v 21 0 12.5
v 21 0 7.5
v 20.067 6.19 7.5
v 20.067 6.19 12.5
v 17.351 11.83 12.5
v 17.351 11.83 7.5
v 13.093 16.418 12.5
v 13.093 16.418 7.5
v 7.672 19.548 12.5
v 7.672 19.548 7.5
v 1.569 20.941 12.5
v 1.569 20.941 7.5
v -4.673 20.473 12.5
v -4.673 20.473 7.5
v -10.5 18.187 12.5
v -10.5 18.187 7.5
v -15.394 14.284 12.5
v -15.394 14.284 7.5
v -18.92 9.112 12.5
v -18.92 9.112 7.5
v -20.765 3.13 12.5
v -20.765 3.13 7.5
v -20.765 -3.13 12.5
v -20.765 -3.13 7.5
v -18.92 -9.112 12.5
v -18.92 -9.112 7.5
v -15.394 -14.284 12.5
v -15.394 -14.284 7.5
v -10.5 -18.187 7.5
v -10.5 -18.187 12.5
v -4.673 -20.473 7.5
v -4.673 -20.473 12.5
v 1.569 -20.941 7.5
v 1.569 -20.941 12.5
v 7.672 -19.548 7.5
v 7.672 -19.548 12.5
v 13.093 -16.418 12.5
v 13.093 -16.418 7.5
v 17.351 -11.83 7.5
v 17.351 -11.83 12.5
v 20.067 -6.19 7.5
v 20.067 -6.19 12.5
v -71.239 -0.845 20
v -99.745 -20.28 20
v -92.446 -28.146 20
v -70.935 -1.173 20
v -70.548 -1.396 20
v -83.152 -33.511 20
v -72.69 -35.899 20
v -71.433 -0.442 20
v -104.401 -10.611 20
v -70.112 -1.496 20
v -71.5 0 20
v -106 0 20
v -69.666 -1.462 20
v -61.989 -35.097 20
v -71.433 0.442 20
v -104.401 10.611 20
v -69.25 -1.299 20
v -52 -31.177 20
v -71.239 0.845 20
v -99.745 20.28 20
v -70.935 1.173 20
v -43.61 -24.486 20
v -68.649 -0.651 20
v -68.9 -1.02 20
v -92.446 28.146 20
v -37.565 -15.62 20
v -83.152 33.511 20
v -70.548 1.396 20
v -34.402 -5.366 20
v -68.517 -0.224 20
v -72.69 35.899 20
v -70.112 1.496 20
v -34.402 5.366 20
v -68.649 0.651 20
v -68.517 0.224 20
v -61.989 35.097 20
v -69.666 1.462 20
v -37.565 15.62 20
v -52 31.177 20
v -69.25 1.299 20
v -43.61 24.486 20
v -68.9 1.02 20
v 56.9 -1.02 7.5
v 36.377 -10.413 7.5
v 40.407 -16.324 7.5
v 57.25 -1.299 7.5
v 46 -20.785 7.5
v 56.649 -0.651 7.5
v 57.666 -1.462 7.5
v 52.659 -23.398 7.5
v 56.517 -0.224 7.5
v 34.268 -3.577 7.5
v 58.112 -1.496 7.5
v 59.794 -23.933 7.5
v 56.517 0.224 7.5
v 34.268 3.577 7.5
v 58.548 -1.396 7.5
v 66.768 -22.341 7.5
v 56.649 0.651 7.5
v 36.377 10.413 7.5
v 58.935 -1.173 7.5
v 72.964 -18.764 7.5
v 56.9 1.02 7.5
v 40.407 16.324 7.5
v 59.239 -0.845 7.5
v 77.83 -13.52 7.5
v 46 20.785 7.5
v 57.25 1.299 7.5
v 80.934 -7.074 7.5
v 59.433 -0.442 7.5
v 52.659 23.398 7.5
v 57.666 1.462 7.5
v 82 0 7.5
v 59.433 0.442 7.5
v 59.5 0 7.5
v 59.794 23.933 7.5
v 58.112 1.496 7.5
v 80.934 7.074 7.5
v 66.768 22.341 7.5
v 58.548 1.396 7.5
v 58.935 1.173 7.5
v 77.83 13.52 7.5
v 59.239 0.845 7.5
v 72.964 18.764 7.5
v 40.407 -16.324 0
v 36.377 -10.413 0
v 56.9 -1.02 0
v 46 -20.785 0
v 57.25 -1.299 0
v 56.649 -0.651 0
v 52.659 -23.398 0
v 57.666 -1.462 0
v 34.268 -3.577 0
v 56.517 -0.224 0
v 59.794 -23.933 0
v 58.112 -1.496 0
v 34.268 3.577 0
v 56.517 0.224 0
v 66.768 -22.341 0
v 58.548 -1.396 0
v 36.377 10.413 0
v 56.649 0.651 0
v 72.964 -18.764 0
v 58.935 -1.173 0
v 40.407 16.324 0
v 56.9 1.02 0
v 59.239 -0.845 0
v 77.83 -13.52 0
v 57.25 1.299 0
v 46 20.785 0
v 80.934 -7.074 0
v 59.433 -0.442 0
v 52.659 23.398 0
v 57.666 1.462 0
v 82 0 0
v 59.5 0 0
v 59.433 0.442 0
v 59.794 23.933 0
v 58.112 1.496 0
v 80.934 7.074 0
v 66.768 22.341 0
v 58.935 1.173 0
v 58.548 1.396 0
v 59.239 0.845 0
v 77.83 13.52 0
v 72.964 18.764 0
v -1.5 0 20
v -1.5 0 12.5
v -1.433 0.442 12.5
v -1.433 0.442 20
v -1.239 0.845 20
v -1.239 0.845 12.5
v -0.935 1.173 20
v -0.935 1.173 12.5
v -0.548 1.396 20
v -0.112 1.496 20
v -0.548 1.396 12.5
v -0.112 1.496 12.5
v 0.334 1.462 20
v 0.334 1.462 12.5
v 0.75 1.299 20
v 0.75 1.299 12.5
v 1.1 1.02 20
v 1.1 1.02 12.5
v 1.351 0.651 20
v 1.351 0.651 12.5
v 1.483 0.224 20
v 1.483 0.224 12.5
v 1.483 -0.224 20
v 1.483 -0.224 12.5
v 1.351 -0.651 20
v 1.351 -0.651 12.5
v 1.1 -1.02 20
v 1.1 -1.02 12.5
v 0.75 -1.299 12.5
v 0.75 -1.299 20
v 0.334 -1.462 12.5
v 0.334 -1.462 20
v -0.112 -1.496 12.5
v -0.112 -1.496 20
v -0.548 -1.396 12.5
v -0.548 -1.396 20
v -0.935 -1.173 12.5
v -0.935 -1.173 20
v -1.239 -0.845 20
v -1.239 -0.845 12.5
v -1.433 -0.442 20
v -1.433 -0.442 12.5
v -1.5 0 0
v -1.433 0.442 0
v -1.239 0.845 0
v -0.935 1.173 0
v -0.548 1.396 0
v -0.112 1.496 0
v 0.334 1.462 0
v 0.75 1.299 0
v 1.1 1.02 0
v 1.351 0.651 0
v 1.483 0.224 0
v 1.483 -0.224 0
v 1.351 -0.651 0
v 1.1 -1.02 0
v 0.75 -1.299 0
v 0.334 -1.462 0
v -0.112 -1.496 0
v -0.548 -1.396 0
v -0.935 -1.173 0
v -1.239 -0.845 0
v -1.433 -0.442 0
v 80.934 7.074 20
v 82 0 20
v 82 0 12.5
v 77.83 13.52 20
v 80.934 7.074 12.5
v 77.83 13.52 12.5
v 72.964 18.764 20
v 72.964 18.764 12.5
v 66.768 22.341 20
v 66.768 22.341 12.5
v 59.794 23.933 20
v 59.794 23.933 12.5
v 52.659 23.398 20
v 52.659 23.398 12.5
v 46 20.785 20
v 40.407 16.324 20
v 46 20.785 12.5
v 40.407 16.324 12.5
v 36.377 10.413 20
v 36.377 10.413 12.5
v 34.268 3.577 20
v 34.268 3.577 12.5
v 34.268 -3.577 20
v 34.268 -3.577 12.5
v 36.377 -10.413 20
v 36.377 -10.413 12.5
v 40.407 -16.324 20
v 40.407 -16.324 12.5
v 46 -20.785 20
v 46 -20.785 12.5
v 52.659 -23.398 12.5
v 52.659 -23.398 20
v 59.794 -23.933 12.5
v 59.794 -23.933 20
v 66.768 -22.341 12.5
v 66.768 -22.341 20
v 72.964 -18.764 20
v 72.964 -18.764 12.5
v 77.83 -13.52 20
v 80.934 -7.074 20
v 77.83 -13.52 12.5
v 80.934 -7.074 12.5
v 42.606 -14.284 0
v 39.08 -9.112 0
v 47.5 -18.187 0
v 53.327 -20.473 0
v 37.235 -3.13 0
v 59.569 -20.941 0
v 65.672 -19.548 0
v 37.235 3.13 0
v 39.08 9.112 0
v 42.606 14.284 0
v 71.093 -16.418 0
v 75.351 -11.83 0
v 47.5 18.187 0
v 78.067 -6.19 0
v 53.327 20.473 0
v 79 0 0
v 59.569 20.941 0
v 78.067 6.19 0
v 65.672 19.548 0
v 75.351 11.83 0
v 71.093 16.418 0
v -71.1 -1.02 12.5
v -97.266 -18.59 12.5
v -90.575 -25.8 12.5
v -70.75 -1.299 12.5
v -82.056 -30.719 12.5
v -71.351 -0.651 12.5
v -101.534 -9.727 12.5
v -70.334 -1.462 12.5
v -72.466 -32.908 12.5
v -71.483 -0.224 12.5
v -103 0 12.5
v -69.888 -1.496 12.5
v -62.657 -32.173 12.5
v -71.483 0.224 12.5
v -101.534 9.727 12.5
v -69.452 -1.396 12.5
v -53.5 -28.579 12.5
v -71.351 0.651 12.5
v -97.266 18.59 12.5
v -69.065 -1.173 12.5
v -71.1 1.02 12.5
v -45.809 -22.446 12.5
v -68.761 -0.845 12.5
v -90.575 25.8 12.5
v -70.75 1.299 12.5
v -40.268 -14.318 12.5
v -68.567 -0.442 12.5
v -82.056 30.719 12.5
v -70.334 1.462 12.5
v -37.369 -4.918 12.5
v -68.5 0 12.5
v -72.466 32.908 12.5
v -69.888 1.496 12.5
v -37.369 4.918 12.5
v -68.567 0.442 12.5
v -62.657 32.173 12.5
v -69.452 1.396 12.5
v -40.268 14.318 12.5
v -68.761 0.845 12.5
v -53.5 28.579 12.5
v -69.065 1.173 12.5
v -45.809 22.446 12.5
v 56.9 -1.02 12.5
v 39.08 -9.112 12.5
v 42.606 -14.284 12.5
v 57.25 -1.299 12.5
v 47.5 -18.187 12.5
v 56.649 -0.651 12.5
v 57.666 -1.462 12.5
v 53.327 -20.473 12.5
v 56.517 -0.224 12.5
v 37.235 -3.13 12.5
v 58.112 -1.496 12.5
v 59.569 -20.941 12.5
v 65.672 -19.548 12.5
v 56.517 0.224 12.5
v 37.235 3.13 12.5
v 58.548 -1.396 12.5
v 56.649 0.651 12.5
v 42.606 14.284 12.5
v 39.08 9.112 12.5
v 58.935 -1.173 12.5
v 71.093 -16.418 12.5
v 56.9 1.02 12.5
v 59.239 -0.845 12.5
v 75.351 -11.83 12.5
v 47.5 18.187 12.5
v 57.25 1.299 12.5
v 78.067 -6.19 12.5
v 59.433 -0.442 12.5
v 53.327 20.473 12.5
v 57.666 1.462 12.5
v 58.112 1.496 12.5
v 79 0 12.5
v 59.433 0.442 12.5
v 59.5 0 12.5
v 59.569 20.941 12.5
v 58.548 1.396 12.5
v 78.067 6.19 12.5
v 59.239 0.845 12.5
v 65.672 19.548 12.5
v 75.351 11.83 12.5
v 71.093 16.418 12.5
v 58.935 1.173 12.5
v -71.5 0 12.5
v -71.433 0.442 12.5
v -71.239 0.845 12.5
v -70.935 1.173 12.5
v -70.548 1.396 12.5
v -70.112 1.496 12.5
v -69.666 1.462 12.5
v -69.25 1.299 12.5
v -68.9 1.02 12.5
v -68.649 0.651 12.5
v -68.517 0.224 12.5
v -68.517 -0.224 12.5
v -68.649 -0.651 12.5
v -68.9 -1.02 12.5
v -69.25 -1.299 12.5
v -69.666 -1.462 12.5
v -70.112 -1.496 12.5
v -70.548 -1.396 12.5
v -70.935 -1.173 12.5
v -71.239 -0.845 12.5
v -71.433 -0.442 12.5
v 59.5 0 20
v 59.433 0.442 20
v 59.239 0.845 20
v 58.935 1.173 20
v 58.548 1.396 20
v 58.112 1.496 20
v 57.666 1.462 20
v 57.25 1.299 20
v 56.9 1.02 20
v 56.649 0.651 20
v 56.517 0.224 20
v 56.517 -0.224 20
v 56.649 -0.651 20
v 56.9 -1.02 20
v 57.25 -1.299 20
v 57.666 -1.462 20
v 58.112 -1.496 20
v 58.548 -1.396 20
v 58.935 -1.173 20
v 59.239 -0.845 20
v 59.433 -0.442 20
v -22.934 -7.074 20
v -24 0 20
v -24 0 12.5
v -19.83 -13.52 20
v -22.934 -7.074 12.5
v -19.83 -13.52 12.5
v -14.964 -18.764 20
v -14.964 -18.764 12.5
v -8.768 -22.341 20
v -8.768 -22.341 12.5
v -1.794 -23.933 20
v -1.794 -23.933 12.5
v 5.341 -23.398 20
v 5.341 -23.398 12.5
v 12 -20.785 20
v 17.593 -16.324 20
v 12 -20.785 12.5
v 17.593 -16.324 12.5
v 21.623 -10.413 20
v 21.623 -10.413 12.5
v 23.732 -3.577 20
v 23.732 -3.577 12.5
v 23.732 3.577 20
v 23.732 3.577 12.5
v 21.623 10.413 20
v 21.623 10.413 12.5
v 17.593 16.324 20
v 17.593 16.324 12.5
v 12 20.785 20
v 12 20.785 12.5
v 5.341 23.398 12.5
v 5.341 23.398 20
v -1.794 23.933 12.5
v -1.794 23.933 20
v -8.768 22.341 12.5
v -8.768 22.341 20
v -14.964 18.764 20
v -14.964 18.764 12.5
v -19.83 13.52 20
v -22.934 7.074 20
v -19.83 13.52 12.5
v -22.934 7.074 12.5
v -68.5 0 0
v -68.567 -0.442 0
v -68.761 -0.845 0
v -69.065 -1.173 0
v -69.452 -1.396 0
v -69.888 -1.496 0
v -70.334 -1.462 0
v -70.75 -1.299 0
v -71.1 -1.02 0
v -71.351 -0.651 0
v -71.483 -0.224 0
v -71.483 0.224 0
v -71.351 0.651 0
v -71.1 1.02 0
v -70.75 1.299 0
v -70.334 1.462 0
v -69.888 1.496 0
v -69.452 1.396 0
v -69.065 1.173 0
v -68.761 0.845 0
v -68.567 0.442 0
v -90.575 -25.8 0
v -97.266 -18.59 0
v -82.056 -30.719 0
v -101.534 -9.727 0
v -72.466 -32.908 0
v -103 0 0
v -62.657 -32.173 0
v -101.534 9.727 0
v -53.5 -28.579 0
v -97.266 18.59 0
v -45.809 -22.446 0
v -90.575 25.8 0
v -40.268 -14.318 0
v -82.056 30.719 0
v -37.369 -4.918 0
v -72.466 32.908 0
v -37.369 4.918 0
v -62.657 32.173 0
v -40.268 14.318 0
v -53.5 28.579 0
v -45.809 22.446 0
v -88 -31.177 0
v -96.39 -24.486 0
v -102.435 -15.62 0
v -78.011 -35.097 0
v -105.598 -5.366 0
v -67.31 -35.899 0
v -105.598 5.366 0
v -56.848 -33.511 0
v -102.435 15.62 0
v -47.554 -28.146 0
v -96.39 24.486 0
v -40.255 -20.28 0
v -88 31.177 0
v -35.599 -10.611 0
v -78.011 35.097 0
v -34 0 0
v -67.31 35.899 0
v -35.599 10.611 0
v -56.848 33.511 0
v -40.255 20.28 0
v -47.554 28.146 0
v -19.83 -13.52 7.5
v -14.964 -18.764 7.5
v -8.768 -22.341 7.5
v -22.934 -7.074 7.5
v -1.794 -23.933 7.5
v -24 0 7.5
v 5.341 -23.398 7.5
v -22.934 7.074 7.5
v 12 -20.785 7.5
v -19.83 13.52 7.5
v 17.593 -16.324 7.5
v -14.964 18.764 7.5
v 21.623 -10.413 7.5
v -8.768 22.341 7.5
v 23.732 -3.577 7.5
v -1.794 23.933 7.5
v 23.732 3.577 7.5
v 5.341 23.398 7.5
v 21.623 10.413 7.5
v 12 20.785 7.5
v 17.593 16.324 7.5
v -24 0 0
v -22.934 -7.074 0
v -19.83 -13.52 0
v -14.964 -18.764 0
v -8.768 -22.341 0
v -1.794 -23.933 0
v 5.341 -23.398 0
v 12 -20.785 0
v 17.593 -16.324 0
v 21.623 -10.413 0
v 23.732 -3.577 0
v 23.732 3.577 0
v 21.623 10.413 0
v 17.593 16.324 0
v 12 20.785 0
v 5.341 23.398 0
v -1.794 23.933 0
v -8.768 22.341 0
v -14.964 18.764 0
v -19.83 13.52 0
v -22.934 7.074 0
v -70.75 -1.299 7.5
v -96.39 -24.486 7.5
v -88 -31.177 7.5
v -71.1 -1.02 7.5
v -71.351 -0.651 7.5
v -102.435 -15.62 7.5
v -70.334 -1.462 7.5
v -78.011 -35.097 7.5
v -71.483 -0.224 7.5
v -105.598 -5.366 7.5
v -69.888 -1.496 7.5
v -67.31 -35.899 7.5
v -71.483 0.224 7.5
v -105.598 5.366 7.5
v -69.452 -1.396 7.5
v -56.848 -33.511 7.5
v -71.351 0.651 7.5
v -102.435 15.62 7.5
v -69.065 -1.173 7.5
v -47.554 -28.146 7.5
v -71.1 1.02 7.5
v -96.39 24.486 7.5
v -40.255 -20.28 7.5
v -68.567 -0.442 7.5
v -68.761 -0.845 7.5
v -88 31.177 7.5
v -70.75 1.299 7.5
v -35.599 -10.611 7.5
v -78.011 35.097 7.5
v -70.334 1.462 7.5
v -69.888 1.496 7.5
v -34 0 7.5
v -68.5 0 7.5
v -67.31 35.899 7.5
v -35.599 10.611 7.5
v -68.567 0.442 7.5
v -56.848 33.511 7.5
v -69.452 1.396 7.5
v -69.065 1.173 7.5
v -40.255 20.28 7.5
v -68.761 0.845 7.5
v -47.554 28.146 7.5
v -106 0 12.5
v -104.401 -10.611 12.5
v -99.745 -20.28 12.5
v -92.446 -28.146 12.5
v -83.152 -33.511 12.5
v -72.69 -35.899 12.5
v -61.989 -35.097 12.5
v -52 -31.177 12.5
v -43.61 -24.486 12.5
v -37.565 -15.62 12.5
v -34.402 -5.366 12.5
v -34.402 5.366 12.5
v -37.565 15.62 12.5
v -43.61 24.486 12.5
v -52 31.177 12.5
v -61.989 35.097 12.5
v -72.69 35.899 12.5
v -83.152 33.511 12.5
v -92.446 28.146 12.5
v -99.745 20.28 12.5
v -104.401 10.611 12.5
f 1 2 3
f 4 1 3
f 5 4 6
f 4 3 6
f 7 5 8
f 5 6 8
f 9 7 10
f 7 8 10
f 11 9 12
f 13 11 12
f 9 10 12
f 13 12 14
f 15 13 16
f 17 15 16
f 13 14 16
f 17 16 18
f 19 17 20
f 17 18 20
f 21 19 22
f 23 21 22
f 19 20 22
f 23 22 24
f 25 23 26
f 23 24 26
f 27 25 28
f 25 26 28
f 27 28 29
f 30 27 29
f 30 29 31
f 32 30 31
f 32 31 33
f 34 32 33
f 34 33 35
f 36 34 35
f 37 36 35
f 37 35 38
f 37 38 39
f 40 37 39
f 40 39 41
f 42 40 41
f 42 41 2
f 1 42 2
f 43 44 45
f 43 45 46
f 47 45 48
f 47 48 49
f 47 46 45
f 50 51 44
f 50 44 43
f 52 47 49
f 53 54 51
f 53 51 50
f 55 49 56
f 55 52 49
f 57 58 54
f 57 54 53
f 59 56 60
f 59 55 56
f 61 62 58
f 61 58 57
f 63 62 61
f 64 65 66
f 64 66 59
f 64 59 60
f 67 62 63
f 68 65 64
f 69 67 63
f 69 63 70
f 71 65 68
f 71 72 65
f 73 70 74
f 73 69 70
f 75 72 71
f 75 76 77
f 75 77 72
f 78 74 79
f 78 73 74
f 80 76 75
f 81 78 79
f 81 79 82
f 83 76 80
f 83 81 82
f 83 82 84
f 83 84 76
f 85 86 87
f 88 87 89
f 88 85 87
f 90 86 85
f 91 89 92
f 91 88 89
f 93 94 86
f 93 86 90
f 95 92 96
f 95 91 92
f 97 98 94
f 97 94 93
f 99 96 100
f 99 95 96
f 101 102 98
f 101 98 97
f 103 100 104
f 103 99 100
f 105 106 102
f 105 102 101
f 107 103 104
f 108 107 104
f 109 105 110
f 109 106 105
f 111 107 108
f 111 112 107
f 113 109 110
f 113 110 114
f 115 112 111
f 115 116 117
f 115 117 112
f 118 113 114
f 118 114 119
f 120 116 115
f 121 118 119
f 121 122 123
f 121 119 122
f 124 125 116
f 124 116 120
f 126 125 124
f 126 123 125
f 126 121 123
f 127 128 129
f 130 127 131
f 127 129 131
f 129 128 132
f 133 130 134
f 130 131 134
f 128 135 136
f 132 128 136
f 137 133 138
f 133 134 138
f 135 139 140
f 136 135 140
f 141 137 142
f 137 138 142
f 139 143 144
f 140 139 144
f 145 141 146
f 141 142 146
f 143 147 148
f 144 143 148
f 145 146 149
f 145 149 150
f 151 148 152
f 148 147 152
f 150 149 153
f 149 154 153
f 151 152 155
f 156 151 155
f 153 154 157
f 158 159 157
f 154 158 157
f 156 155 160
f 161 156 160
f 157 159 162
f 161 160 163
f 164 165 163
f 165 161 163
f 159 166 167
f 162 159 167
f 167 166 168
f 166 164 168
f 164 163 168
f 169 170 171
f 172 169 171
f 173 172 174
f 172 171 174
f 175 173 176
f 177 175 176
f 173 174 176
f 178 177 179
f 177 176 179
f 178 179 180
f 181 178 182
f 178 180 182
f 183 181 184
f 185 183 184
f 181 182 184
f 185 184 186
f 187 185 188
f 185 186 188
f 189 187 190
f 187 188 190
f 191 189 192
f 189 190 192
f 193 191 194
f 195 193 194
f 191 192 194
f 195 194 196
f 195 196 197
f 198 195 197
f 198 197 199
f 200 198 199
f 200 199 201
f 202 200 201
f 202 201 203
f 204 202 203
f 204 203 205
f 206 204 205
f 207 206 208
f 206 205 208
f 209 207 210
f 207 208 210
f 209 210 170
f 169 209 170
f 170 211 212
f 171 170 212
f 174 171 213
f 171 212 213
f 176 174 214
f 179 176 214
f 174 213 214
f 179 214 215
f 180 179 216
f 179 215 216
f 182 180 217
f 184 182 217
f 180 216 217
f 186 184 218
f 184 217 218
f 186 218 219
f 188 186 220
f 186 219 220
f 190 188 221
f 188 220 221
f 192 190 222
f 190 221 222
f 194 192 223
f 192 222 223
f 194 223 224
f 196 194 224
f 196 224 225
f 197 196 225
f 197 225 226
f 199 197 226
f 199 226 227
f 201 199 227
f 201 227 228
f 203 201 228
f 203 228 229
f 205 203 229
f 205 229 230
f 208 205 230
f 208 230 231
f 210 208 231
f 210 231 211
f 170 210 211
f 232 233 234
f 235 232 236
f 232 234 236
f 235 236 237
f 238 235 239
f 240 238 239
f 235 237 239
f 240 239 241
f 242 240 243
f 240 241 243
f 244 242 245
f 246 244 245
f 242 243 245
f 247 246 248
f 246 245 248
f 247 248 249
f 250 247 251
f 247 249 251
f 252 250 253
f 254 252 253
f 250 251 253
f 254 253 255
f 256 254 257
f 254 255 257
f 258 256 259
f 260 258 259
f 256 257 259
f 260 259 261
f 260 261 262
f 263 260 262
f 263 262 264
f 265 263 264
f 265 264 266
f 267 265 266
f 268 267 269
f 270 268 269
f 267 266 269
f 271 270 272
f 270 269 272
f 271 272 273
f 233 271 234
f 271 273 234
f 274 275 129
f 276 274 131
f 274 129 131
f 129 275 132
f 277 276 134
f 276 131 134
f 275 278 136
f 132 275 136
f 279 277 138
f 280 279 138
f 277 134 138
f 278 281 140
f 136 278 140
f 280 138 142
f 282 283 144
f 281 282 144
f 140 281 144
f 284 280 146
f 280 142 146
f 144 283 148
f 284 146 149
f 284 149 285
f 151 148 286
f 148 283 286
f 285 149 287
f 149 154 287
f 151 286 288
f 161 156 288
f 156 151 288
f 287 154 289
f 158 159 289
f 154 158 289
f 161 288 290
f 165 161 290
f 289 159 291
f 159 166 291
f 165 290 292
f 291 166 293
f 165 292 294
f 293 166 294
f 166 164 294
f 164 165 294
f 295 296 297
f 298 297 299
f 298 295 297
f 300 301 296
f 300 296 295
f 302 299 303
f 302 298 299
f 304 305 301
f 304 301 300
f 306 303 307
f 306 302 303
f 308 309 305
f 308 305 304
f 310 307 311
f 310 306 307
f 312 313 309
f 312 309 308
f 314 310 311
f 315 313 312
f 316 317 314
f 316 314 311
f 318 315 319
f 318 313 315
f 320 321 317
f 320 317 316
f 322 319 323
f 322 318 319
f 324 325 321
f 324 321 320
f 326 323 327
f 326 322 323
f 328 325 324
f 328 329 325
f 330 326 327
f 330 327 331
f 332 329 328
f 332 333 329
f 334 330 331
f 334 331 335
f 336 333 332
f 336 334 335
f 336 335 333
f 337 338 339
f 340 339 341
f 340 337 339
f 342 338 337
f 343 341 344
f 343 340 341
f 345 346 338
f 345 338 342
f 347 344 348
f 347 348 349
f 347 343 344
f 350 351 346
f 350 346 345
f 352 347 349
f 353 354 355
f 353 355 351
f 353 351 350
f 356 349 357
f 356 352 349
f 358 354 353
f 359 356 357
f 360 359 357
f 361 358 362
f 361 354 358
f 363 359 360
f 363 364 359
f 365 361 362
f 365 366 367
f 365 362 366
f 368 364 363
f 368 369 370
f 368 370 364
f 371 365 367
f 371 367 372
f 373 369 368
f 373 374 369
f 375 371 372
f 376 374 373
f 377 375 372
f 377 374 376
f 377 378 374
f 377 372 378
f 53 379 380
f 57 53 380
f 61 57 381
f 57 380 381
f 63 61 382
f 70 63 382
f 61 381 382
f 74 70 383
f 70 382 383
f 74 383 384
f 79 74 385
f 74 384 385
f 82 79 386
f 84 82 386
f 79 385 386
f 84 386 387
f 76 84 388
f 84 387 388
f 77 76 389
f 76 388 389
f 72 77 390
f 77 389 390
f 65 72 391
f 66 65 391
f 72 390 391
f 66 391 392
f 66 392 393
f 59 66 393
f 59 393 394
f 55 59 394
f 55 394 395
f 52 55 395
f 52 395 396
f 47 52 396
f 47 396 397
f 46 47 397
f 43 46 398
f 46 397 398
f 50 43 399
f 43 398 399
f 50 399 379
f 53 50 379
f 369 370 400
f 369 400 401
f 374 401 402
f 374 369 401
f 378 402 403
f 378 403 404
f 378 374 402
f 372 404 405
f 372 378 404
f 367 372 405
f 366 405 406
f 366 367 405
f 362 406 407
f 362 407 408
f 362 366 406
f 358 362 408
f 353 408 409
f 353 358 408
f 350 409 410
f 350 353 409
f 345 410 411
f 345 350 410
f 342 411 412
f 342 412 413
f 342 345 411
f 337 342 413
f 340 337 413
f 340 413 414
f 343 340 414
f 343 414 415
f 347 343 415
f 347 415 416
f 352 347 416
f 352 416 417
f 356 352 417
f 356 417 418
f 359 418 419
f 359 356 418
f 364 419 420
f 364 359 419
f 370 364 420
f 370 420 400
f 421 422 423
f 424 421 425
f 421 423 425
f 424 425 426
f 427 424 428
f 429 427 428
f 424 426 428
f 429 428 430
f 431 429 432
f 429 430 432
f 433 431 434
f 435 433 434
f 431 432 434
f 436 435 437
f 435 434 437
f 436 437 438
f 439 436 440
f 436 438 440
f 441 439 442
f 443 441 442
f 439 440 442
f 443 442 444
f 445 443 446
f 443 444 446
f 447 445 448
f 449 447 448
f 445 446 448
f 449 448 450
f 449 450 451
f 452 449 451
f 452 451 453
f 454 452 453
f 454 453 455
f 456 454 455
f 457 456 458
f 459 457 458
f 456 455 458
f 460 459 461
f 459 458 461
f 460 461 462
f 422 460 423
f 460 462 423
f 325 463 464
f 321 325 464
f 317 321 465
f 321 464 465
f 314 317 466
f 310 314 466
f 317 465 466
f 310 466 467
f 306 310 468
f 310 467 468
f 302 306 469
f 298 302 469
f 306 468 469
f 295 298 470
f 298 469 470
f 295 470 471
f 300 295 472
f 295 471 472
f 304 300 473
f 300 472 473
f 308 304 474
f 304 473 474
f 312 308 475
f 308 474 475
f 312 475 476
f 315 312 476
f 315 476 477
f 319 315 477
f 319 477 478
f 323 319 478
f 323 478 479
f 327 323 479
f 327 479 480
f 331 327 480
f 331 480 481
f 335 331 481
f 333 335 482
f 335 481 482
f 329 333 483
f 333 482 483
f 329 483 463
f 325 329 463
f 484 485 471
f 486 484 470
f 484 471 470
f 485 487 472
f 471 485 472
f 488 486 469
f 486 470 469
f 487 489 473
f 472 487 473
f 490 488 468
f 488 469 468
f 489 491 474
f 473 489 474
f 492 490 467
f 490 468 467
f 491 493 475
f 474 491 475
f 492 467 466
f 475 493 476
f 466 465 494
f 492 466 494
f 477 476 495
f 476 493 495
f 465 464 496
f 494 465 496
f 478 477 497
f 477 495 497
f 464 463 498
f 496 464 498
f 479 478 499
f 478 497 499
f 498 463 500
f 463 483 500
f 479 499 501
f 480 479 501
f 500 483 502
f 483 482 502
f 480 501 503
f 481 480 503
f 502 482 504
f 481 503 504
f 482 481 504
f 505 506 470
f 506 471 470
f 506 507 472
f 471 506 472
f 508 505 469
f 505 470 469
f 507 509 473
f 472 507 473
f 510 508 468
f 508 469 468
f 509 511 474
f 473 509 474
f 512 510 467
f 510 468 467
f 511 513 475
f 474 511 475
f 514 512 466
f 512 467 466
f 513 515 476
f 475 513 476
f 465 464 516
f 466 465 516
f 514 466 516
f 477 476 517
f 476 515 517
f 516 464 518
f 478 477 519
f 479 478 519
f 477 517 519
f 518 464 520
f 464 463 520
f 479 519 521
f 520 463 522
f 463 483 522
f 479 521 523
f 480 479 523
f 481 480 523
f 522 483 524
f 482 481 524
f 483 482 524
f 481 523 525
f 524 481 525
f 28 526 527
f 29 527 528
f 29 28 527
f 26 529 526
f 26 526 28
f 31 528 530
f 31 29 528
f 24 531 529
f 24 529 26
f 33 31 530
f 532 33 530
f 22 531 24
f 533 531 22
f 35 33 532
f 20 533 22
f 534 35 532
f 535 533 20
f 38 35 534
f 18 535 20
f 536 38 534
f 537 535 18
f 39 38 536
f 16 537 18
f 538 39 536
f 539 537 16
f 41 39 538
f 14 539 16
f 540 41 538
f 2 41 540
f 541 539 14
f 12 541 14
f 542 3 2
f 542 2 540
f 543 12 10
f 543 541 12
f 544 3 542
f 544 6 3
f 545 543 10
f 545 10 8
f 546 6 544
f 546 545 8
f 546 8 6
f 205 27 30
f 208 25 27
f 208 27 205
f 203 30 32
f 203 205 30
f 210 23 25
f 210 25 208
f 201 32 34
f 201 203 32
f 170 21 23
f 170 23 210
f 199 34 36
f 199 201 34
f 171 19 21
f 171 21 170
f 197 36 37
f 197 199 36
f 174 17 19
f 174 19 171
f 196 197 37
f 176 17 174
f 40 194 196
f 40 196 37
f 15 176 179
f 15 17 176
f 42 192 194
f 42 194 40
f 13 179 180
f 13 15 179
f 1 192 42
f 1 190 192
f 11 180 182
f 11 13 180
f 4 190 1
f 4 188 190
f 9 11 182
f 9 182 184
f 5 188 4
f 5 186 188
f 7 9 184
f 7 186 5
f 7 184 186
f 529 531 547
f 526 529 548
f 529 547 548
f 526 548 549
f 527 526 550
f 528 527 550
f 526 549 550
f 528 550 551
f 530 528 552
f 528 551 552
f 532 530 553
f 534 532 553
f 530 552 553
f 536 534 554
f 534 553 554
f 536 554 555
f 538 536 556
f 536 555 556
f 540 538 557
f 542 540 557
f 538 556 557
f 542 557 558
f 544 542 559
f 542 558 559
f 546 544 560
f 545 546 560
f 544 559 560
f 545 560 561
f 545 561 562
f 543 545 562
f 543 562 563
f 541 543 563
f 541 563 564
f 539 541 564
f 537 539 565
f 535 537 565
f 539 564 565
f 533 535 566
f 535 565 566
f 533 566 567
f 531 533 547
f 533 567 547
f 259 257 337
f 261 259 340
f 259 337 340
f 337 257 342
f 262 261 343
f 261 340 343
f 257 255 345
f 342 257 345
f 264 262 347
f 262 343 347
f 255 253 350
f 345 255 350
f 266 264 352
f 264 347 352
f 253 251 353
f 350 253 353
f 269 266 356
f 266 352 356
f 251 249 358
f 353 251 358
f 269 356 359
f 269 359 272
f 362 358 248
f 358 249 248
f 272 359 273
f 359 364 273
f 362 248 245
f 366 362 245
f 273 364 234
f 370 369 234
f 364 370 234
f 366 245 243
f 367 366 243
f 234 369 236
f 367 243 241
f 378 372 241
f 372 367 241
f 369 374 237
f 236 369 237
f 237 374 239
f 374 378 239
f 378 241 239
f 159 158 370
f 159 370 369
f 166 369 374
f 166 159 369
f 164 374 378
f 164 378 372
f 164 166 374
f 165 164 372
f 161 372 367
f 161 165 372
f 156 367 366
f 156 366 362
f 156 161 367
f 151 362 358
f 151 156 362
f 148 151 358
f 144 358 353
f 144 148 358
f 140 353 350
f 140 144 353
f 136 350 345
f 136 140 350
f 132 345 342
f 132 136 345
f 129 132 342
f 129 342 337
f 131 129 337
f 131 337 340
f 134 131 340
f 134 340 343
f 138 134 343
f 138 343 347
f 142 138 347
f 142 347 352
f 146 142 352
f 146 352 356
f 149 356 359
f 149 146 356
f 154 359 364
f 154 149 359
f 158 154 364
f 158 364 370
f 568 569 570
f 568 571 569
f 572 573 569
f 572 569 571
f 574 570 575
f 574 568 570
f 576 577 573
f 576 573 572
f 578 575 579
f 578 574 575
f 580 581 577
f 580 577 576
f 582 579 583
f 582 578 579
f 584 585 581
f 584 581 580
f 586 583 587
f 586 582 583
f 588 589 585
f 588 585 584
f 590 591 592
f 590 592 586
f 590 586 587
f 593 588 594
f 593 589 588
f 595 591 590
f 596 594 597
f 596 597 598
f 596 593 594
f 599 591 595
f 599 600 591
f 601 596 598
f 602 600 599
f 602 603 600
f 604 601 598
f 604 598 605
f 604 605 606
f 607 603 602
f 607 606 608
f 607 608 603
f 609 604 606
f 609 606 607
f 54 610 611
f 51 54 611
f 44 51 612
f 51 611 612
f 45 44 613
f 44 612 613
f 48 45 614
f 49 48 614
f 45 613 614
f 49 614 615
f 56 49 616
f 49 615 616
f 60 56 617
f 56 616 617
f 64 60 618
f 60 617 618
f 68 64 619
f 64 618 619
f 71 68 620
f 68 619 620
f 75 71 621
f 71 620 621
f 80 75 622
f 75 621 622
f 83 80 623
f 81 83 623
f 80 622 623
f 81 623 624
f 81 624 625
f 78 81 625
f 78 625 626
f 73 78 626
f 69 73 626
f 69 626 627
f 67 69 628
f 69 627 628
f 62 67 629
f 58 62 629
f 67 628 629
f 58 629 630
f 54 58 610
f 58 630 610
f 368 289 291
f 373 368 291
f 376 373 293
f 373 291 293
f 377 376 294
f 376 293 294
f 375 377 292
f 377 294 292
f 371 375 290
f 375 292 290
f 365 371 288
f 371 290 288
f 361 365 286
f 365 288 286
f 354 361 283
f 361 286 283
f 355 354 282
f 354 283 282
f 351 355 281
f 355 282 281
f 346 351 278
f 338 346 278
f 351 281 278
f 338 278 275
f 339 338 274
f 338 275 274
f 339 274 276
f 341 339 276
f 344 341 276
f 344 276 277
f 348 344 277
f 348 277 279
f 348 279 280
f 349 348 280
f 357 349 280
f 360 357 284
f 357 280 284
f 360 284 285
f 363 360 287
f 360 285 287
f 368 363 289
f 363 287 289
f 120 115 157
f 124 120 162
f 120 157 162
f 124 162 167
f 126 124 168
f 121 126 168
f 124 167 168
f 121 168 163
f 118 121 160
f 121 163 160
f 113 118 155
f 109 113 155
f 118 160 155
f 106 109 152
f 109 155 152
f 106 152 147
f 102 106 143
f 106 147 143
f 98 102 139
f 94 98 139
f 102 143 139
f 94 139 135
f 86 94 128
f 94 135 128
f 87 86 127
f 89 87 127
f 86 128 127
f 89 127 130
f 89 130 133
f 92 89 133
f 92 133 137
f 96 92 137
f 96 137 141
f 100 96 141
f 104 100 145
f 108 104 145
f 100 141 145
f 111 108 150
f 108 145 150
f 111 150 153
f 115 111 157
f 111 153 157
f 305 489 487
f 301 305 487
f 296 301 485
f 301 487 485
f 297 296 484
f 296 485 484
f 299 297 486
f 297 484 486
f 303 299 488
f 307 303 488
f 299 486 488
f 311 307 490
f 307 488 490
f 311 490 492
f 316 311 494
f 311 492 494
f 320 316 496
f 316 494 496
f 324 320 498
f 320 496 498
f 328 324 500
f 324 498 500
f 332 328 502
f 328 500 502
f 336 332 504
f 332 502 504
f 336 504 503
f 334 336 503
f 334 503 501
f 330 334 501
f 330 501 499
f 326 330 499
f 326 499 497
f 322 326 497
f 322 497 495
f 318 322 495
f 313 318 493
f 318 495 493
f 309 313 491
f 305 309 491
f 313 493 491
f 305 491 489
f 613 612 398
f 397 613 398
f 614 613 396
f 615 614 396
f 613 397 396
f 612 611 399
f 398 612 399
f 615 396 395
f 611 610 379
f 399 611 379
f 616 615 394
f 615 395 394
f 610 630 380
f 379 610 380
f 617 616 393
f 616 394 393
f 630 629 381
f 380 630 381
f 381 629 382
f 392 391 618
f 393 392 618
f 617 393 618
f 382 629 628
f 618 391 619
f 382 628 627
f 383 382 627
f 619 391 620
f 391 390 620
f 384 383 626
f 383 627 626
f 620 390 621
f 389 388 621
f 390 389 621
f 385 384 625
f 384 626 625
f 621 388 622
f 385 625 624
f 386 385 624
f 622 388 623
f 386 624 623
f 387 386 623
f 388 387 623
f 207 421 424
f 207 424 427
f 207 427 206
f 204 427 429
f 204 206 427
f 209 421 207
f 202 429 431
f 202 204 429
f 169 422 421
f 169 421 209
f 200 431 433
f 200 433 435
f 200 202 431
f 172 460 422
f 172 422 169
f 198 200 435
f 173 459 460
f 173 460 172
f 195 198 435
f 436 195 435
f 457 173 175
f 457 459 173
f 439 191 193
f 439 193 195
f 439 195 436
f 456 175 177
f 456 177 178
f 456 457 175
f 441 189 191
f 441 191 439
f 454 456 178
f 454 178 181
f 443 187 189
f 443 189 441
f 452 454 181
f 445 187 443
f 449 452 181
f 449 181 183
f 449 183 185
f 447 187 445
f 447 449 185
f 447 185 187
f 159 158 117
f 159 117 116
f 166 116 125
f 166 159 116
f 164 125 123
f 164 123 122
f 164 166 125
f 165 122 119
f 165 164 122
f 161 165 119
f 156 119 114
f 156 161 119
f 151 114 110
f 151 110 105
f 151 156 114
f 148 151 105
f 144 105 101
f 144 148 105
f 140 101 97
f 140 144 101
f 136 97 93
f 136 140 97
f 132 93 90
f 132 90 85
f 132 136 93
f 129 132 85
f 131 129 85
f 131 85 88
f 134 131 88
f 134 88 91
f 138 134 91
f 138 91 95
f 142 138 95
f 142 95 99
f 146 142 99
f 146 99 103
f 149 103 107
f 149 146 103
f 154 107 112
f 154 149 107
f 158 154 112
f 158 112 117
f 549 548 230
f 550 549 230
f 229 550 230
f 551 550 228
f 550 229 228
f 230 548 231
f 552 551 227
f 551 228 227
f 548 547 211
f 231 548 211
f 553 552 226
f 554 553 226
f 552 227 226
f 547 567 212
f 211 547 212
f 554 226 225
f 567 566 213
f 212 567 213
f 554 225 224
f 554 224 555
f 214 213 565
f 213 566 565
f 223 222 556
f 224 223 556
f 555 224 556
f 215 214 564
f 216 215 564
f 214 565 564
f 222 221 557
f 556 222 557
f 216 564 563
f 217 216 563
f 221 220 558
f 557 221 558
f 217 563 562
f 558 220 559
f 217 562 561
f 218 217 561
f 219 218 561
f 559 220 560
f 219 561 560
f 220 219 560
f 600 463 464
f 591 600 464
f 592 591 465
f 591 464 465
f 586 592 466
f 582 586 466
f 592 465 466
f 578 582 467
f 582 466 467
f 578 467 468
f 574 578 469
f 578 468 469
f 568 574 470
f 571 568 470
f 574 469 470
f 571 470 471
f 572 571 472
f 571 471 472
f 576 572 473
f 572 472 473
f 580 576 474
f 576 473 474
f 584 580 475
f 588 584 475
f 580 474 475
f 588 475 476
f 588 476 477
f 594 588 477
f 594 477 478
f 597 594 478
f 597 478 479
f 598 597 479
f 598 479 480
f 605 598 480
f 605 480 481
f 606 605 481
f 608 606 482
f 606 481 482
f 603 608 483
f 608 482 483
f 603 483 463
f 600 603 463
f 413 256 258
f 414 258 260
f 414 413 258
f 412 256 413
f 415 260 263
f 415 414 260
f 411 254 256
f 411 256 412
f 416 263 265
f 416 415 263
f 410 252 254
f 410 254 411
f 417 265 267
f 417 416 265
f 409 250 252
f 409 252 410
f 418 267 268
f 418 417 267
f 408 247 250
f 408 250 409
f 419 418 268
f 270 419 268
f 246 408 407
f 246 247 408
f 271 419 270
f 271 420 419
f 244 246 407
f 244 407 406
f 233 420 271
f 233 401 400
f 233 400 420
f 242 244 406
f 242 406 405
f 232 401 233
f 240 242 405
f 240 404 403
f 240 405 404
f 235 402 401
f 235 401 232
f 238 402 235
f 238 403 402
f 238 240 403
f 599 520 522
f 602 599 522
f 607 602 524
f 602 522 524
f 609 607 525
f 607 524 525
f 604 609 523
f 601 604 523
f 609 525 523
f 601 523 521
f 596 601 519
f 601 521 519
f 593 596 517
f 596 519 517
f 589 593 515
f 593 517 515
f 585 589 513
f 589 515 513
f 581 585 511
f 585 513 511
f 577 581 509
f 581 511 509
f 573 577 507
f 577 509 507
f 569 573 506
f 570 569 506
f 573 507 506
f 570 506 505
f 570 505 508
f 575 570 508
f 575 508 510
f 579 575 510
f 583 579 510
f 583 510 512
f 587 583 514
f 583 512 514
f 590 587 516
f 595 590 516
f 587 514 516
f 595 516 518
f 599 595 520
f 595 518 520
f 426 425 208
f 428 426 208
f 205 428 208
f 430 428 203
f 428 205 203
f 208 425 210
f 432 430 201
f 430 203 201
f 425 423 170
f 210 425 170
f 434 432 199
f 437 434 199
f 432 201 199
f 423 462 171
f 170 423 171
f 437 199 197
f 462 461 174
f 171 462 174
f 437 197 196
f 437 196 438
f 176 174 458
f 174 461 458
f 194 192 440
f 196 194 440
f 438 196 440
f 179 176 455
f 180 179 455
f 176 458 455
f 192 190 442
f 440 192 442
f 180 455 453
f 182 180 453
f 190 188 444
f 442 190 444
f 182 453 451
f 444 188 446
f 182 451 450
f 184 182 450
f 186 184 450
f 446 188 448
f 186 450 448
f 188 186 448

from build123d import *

# Parameters (mm, degrees)
F1_DEPTH = 7.5
F2_DEPTH = 12.5
F3_START = 12.5
F3_DEPTH = 7.5
F5_DEPTH = 7.5
F4_R     = 24
F4_R_2   = 21
F4_R_3   = 1.5
F6_DEPTH = 12.5
F7_START = 12.5
F7_DEPTH = 7.5


with BuildPart() as f1:
    # F0 (on Top) → F1 (new body)
    with BuildSketch(Plane.XY):
        with BuildLine():
            Line((21, 0), (24, 0))
            ThreePointArc((24, 0), (0, 24), (-24, 0))
            Line((-24, 0), (-21, 0))
            ThreePointArc((-21, 0), (0, 21), (21, 0))
        make_face()
        with BuildLine():
            ThreePointArc((-24, 0), (0, -24), (24, 0))
            Line((24, 0), (21, 0))
            ThreePointArc((21, 0), (0, -21), (-21, 0))
            Line((-21, 0), (-24, 0))
        make_face()
        with BuildLine():
            ThreePointArc((-21, 0), (0, -21), (21, 0))
            Line((21, 0), (1.5, 0))
            ThreePointArc((1.5, 0), (0, -1.5), (-1.5, 0))
            Line((-1.5, 0), (-21, 0))
        make_face()
        with BuildLine():
            Line((1.5, 0), (21, 0))
            ThreePointArc((21, 0), (0, 21), (-21, 0))
            Line((-21, 0), (-1.5, 0))
            ThreePointArc((-1.5, 0), (0, 1.5), (1.5, 0))
        make_face()
    extrude(amount=F1_DEPTH)

    # F0 (on Top) → F2 (join)
    with BuildSketch(Plane.XY):
        with BuildLine():
            ThreePointArc((-21, 0), (0, -21), (21, 0))
            Line((21, 0), (1.5, 0))
            ThreePointArc((1.5, 0), (0, -1.5), (-1.5, 0))
            Line((-1.5, 0), (-21, 0))
        make_face()
        with BuildLine():
            Line((1.5, 0), (21, 0))
            ThreePointArc((21, 0), (0, 21), (-21, 0))
            Line((-21, 0), (-1.5, 0))
            ThreePointArc((-1.5, 0), (0, 1.5), (1.5, 0))
        make_face()
    extrude(amount=F2_DEPTH)


with BuildPart() as f3:
    # F0 (on Top) → F3 (new body)
    with BuildSketch(Plane.XY.offset(F3_START)):
        with BuildLine():
            Line((21, 0), (24, 0))
            ThreePointArc((24, 0), (0, 24), (-24, 0))
            Line((-24, 0), (-21, 0))
            ThreePointArc((-21, 0), (0, 21), (21, 0))
        make_face()
        with BuildLine():
            ThreePointArc((-24, 0), (0, -24), (24, 0))
            Line((24, 0), (21, 0))
            ThreePointArc((21, 0), (0, -21), (-21, 0))
            Line((-21, 0), (-24, 0))
        make_face()
        with BuildLine():
            ThreePointArc((-21, 0), (0, -21), (21, 0))
            Line((21, 0), (1.5, 0))
            ThreePointArc((1.5, 0), (0, -1.5), (-1.5, 0))
            Line((-1.5, 0), (-21, 0))
        make_face()
        with BuildLine():
            Line((1.5, 0), (21, 0))
            ThreePointArc((21, 0), (0, 21), (-21, 0))
            Line((-21, 0), (-1.5, 0))
            ThreePointArc((-1.5, 0), (0, 1.5), (1.5, 0))
        make_face()
    extrude(amount=F3_DEPTH)


with BuildPart() as f5:
    # F4 (on Top) → F5 (new body)
    with BuildSketch(Plane.XY):
        with BuildLine():
            Line((-68.5, 0), (-37, 0))
            ThreePointArc((-37, 0), (-70, 33), (-103, 0))
            Line((-103, 0), (-71.5, 0))
            ThreePointArc((-71.5, 0), (-70, 1.5), (-68.5, 0))
        make_face()
        with BuildLine():
            ThreePointArc((-103, 0), (-70, -33), (-37, 0))
            Line((-37, 0), (-68.5, 0))
            ThreePointArc((-68.5, 0), (-70, -1.5), (-71.5, 0))
            Line((-71.5, 0), (-103, 0))
        make_face()
        with BuildLine():
            ThreePointArc((-106, 0), (-70, -36), (-34, 0))
            Line((-34, 0), (-37, 0))
            ThreePointArc((-37, 0), (-70, -33), (-103, 0))
            Line((-103, 0), (-106, 0))
        make_face()
        with BuildLine():
            Line((-37, 0), (-34, 0))
            ThreePointArc((-34, 0), (-70, 36), (-106, 0))
            Line((-106, 0), (-103, 0))
            ThreePointArc((-103, 0), (-70, 33), (-37, 0))
        make_face()
    extrude(amount=F5_DEPTH)


with BuildPart() as f5b:
    # F4 (on Top) → F5, piece 2 (new body)
    with BuildSketch(Plane.XY):
        with Locations((58, 0)):
            Circle(F4_R)
        with Locations((58, 0)):
            Circle(F4_R_2, mode=Mode.SUBTRACT)
        with Locations((58, 0)):
            Circle(F4_R_2)
        with Locations((58, 0)):
            Circle(F4_R_3, mode=Mode.SUBTRACT)
    extrude(amount=F5_DEPTH)


with BuildPart() as f6:
    # F4 (on Top) → F6 (new body)
    with BuildSketch(Plane.XY):
        with BuildLine():
            Line((-68.5, 0), (-37, 0))
            ThreePointArc((-37, 0), (-70, 33), (-103, 0))
            Line((-103, 0), (-71.5, 0))
            ThreePointArc((-71.5, 0), (-70, 1.5), (-68.5, 0))
        make_face()
        with BuildLine():
            ThreePointArc((-103, 0), (-70, -33), (-37, 0))
            Line((-37, 0), (-68.5, 0))
            ThreePointArc((-68.5, 0), (-70, -1.5), (-71.5, 0))
            Line((-71.5, 0), (-103, 0))
        make_face()
    extrude(amount=F6_DEPTH)


with BuildPart() as f6b:
    # F4 (on Top) → F6, piece 2 (new body)
    with BuildSketch(Plane.XY):
        with Locations((58, 0)):
            Circle(F4_R_2)
        with Locations((58, 0)):
            Circle(F4_R_3, mode=Mode.SUBTRACT)
    extrude(amount=F6_DEPTH)


with BuildPart() as f7:
    # F4 (on Top) → F7 (new body)
    with BuildSketch(Plane.XY.offset(F7_START)):
        with BuildLine():
            ThreePointArc((-103, 0), (-70, -33), (-37, 0))
            Line((-37, 0), (-68.5, 0))
            ThreePointArc((-68.5, 0), (-70, -1.5), (-71.5, 0))
            Line((-71.5, 0), (-103, 0))
        make_face()
        with BuildLine():
            Line((-68.5, 0), (-37, 0))
            ThreePointArc((-37, 0), (-70, 33), (-103, 0))
            Line((-103, 0), (-71.5, 0))
            ThreePointArc((-71.5, 0), (-70, 1.5), (-68.5, 0))
        make_face()
        with BuildLine():
            Line((-37, 0), (-34, 0))
            ThreePointArc((-34, 0), (-70, 36), (-106, 0))
            Line((-106, 0), (-103, 0))
            ThreePointArc((-103, 0), (-70, 33), (-37, 0))
        make_face()
        with BuildLine():
            ThreePointArc((-106, 0), (-70, -36), (-34, 0))
            Line((-34, 0), (-37, 0))
            ThreePointArc((-37, 0), (-70, -33), (-103, 0))
            Line((-103, 0), (-106, 0))
        make_face()
    extrude(amount=F7_DEPTH)


with BuildPart() as f7b:
    # F4 (on Top) → F7, piece 2 (new body)
    with BuildSketch(Plane.XY.offset(F7_START)):
        with Locations((58, 0)):
            Circle(F4_R)
        with Locations((58, 0)):
            Circle(F4_R_2, mode=Mode.SUBTRACT)
        with Locations((58, 0)):
            Circle(F4_R_2)
        with Locations((58, 0)):
            Circle(F4_R_3, mode=Mode.SUBTRACT)
    extrude(amount=F7_DEPTH)


solid = Compound([f1.part, f3.part, f5.part, f5b.part, f6.part, f6b.part, f7.part, f7b.part])
